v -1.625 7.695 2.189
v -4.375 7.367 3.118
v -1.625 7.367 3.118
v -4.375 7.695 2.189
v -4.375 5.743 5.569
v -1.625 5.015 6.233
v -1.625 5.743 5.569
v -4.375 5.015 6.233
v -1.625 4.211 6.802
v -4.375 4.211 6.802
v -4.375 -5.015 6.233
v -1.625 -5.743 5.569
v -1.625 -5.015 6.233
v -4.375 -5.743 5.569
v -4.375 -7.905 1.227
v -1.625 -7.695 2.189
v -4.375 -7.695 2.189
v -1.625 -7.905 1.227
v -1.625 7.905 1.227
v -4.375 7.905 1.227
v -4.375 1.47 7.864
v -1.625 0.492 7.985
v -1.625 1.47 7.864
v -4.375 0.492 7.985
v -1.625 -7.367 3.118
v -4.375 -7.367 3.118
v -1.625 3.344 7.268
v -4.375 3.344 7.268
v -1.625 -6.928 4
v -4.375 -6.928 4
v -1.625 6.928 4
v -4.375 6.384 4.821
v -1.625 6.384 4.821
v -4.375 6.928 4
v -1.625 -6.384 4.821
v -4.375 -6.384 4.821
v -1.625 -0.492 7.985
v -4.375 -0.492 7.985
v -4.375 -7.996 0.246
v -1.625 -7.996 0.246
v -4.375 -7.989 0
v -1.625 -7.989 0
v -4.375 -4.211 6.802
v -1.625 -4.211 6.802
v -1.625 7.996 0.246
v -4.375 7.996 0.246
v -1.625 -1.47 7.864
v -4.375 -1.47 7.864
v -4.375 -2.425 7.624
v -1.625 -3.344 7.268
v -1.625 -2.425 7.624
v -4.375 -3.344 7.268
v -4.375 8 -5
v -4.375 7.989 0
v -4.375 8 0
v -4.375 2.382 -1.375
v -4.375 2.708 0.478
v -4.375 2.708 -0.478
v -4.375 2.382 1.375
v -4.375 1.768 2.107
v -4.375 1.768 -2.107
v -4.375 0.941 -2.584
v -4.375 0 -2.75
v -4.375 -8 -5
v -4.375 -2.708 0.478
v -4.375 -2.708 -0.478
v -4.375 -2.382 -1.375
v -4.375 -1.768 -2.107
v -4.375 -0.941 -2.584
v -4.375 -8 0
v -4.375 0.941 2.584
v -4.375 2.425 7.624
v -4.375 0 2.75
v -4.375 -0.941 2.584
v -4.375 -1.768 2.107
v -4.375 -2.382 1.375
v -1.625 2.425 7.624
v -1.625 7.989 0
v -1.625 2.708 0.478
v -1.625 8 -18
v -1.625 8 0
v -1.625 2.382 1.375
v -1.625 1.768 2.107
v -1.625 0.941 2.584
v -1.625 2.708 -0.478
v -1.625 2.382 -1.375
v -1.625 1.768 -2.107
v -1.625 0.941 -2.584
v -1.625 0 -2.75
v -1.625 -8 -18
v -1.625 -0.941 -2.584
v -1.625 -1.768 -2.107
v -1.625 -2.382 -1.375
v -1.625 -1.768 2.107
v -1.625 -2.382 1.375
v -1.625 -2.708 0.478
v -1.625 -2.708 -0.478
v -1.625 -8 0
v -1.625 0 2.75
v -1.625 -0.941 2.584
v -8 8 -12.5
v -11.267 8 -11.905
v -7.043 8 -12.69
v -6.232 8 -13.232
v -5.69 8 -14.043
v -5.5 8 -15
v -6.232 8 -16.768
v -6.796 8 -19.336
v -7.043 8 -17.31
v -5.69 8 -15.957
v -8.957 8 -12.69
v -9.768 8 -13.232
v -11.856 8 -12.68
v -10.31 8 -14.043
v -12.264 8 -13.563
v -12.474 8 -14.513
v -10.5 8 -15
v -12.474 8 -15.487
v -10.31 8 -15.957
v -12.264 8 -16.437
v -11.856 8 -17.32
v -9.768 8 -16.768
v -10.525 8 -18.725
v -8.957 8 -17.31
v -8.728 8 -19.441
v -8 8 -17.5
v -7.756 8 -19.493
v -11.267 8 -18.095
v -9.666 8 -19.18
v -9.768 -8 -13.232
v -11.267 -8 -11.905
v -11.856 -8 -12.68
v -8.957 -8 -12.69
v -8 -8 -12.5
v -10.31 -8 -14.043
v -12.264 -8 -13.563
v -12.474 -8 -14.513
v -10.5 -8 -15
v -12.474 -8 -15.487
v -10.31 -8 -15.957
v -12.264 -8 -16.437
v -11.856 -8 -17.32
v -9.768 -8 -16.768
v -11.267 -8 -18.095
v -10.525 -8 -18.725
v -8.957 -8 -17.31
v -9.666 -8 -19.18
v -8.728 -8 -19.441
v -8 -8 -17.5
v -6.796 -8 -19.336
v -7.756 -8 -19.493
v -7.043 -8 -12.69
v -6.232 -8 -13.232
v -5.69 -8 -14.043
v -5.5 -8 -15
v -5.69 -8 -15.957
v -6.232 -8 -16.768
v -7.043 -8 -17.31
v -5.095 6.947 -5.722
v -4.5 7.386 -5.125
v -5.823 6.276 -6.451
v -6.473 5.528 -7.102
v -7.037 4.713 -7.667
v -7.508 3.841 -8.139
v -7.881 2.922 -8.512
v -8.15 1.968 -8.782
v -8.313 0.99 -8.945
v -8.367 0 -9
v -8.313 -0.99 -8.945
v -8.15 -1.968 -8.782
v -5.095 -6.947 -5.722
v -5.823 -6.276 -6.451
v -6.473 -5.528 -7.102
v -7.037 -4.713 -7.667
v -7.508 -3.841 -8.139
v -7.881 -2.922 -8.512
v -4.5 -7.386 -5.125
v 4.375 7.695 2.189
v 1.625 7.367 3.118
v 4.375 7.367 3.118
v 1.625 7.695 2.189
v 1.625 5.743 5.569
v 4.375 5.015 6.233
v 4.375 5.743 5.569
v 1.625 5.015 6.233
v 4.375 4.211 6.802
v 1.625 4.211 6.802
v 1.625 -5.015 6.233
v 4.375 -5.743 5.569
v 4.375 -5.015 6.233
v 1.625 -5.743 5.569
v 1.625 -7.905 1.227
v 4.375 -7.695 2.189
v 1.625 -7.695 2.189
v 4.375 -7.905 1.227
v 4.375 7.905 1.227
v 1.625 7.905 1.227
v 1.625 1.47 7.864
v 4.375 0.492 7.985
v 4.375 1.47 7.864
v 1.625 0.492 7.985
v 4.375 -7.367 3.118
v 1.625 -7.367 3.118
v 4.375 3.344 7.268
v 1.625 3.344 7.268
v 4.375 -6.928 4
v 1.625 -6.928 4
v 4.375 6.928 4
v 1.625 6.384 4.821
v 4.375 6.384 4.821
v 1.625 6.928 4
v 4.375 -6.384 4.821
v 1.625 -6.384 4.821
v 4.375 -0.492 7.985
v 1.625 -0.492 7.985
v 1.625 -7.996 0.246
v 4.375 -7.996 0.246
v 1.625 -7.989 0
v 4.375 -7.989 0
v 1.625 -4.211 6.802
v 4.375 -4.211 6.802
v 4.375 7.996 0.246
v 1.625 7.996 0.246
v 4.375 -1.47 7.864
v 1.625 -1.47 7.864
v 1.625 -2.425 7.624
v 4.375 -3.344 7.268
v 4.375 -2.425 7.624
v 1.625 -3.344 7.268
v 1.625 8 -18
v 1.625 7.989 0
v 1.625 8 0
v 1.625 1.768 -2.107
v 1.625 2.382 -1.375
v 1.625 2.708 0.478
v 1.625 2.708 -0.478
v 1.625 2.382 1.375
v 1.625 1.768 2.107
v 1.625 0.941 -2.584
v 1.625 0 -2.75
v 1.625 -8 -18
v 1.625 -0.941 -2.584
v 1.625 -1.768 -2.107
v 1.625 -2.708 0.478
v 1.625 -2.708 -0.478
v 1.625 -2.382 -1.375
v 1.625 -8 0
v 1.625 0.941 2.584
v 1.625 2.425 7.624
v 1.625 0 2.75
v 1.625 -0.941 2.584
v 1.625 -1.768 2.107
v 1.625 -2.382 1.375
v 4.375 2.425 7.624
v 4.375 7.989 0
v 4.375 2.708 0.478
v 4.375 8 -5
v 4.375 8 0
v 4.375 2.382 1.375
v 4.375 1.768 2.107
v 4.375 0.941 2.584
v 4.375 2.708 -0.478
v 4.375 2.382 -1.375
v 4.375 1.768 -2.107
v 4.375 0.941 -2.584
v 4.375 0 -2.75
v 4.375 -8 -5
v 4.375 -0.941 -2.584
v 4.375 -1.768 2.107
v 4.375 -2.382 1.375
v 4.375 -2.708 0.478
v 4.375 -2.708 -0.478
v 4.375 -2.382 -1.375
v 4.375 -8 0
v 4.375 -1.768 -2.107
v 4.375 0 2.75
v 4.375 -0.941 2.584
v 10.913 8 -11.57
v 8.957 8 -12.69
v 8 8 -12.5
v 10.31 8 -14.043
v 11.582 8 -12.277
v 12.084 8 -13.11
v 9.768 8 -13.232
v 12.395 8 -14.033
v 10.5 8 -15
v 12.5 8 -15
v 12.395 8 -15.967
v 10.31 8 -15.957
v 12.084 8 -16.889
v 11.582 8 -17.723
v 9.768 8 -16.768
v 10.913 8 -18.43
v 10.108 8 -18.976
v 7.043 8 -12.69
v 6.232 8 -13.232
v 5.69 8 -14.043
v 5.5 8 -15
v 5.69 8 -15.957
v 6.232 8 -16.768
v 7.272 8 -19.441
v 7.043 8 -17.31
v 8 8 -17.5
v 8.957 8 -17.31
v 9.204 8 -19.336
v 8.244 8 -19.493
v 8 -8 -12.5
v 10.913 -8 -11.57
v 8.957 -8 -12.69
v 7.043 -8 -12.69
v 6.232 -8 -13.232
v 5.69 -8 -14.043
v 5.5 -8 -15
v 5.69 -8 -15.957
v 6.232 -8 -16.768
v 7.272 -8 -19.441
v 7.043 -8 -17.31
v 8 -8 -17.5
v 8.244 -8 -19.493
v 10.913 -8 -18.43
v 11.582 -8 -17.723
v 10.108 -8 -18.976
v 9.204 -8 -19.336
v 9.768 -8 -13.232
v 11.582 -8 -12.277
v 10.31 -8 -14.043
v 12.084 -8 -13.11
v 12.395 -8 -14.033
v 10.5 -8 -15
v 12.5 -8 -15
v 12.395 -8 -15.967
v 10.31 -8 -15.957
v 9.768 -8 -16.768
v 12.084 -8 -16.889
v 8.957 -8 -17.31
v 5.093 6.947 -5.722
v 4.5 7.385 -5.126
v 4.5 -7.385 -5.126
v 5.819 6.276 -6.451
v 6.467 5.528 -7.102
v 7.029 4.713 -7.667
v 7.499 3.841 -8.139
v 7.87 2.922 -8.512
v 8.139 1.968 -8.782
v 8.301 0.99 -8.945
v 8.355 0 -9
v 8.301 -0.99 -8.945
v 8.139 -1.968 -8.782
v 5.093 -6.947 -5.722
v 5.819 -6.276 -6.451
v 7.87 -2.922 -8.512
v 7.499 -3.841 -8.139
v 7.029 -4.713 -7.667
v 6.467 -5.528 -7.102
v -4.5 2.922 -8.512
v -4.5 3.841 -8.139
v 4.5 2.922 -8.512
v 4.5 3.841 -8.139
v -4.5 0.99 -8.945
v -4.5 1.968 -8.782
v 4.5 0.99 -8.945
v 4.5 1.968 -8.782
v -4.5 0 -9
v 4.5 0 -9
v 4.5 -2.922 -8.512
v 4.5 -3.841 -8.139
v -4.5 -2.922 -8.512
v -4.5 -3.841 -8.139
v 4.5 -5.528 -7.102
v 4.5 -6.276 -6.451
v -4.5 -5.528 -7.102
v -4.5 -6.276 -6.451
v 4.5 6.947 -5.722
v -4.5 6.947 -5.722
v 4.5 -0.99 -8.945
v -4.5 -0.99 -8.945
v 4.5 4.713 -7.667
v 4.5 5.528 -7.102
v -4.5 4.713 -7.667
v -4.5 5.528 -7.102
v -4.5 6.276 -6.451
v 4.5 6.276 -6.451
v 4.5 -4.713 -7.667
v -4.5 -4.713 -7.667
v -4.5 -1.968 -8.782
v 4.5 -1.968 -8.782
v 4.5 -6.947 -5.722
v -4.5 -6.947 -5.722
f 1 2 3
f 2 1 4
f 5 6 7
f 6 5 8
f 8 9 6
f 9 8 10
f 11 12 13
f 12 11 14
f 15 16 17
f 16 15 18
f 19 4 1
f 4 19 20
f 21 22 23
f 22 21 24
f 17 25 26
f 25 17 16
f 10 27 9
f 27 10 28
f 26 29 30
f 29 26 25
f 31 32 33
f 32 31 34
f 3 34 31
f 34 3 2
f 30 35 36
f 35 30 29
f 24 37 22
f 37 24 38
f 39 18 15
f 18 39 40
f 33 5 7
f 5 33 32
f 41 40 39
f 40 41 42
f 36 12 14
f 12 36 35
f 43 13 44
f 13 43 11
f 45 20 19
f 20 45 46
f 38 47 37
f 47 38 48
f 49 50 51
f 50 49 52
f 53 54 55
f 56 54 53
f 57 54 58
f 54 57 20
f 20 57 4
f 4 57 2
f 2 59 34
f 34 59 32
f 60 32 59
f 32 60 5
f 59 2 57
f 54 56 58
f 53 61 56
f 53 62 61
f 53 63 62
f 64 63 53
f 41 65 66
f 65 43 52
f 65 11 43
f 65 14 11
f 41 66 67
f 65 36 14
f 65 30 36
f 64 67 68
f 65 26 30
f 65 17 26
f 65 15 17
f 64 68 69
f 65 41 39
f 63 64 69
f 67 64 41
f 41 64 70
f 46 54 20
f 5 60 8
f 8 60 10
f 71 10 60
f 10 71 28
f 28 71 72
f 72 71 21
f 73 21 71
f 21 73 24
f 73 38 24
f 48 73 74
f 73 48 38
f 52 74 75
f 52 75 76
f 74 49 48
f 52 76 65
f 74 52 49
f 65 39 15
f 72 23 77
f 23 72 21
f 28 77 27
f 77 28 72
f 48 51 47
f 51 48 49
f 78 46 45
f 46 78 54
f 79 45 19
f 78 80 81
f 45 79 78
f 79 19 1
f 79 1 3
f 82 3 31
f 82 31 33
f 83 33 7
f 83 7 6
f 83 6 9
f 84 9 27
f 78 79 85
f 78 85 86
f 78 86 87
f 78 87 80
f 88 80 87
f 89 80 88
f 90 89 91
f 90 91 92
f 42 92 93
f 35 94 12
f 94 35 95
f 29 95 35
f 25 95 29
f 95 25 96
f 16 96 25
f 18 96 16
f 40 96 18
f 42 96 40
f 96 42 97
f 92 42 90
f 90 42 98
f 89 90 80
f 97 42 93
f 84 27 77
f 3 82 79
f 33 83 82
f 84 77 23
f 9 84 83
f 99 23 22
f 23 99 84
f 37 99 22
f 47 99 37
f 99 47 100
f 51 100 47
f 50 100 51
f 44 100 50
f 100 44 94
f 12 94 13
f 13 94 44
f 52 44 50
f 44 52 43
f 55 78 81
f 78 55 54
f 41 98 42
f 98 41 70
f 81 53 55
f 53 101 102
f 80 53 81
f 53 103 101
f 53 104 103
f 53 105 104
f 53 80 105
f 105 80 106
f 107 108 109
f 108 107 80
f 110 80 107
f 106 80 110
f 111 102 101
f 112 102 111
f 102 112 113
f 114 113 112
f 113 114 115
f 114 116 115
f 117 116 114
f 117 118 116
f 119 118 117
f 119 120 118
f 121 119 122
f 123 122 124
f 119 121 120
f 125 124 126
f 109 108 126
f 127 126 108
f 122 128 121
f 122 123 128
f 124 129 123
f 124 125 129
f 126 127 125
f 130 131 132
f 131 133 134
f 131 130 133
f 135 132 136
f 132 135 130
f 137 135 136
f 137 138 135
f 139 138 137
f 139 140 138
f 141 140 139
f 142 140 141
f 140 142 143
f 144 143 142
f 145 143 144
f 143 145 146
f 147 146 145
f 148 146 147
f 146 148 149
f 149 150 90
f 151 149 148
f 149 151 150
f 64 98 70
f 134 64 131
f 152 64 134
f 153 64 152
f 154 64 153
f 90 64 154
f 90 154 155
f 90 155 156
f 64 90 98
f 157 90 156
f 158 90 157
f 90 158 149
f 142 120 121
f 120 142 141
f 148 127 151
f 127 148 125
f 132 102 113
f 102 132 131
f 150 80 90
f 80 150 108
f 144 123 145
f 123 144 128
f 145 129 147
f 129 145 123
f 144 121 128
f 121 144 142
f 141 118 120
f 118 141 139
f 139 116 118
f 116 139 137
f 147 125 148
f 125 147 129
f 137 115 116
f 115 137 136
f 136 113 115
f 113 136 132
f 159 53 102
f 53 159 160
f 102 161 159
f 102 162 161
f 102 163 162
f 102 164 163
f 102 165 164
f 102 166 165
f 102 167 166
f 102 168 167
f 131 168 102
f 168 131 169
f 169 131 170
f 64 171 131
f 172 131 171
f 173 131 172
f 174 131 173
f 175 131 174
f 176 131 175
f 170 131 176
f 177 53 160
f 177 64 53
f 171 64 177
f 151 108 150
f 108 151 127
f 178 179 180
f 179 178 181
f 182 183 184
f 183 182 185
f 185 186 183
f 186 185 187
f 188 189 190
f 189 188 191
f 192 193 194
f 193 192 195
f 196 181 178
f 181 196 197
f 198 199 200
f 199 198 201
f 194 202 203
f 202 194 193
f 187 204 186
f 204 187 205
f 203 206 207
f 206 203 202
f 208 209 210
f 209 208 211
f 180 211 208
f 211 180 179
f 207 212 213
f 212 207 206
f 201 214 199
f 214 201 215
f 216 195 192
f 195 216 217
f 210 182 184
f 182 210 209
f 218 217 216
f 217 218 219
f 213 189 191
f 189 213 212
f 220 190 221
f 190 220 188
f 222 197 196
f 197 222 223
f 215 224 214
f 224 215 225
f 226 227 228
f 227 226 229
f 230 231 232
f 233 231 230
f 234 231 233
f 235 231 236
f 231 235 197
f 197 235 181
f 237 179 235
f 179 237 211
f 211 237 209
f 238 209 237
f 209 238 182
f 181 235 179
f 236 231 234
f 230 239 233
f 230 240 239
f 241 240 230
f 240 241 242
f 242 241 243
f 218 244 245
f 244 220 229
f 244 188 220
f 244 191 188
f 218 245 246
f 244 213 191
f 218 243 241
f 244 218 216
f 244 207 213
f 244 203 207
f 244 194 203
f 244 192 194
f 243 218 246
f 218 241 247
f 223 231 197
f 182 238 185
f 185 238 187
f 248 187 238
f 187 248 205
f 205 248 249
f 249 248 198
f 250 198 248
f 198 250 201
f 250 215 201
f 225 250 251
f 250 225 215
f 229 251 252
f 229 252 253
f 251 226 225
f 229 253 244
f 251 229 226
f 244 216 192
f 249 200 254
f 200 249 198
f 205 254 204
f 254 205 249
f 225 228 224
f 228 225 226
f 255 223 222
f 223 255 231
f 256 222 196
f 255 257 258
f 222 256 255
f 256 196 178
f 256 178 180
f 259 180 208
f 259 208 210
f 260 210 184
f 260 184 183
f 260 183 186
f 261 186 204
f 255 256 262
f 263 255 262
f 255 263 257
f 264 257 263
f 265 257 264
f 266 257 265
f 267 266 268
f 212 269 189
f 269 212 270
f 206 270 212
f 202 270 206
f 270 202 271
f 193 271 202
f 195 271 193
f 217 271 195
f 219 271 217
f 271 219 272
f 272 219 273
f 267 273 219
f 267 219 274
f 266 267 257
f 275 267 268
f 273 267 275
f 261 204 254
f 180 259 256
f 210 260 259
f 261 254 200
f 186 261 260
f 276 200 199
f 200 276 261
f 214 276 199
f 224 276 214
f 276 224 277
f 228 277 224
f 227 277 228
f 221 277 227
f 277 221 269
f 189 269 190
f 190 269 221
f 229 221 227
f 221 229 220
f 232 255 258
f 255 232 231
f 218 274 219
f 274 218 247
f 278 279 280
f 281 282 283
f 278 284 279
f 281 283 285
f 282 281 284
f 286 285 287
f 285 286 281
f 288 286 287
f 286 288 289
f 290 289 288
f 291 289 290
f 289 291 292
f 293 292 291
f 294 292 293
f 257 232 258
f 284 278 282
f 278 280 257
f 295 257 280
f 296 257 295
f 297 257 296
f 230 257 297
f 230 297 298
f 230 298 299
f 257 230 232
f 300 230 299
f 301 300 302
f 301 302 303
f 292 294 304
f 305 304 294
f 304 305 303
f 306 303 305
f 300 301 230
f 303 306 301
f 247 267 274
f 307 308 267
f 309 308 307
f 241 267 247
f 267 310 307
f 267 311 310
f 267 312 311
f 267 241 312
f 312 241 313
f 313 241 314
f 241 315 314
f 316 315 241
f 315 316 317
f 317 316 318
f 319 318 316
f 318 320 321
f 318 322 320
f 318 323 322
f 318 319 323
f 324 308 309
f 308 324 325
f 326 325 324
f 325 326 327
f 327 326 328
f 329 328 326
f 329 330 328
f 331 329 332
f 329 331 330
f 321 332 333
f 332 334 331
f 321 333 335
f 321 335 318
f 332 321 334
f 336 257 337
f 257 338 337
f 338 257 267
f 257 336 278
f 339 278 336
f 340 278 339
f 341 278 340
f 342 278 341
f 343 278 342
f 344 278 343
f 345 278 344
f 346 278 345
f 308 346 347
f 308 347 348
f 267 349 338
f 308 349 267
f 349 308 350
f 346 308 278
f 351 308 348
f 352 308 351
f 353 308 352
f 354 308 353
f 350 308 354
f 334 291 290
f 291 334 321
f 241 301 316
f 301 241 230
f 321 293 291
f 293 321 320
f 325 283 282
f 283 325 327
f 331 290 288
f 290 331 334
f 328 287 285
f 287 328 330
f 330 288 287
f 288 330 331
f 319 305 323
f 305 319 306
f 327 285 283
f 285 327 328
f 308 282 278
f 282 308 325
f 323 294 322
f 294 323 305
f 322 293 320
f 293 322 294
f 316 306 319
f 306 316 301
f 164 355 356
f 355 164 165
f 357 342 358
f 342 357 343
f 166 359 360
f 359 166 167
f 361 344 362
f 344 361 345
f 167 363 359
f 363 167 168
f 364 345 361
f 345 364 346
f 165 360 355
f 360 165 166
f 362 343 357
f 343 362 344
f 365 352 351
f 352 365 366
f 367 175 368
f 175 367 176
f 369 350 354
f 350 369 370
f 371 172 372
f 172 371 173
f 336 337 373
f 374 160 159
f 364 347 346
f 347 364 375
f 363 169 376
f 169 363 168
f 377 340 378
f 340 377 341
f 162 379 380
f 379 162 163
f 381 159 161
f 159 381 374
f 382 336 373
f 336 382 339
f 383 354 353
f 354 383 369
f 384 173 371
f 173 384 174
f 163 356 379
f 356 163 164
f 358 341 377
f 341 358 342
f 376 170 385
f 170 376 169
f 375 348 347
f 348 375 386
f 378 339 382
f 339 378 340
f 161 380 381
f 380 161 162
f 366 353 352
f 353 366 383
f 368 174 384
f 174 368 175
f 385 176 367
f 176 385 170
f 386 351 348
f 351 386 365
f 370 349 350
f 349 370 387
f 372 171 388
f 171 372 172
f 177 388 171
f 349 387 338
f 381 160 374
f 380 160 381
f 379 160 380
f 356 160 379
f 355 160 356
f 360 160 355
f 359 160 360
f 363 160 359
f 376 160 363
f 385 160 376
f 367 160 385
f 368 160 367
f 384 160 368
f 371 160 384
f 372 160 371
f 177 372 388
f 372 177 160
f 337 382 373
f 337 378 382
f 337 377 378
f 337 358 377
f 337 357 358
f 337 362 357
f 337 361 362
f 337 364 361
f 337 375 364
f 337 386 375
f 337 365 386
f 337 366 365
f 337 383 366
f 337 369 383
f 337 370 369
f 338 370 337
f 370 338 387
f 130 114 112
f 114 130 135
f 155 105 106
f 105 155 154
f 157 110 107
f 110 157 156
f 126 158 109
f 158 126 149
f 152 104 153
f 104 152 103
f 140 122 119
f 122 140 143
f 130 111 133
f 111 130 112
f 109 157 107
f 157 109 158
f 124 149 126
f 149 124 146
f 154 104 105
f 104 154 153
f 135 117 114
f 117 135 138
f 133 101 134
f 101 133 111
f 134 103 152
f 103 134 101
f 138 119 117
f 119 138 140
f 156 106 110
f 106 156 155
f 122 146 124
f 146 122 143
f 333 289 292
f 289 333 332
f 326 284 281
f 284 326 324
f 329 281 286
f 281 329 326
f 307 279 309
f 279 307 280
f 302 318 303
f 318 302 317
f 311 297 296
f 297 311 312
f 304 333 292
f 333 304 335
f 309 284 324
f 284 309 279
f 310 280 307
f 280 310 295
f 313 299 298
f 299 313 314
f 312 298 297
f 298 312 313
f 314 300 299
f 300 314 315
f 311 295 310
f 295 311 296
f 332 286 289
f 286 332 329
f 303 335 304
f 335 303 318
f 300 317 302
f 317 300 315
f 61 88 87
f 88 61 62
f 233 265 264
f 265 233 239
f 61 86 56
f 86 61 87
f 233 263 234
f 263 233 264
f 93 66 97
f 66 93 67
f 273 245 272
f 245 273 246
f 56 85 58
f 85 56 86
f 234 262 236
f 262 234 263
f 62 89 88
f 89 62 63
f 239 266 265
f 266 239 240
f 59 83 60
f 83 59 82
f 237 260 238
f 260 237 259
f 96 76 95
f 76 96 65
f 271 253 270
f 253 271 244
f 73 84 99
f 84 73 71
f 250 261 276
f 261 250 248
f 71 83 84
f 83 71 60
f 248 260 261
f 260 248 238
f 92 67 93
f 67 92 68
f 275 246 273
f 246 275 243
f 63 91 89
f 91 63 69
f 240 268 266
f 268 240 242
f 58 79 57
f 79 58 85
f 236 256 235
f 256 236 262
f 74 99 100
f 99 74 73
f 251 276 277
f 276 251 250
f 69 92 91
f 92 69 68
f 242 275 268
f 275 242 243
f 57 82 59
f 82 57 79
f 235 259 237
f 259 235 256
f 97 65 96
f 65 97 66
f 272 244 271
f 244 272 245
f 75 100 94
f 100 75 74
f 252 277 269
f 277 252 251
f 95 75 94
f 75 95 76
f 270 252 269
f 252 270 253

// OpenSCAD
$fs = 1;
$fa = 6;

difference() {
  for (zz=[-3, 3]) {
    _rx() translate([0,0,zz]) cylinder(d=16, h=2.75, center=true);
    translate([zz, 0, -15/2]) cube([2.75, 16, 15], center=true);
    hull() {
      translate([zz, 0, -15/2 - 4]) cube([2.75, 16, 13], center=true);
      translate([sign(zz) * 8, 0, -15]) _ry() cylinder(d=9, h=16, center=true);
    }

  }

  _rx() cylinder(d=5.5, h=100, center=true);

  _rx() difference() {
    cylinder(d=18, h=100, center=true);
    cylinder(d=18, h=9, center=true);
  }

  for (xx=[-8, 8]) {
    translate([xx, 0, -15]) _ry() cylinder(d=5, h=100, center=true);
  }

}

module _ry() {
    rotate([90,0]) children();
}
module _rx() {
    rotate([0,90]) children();
}
